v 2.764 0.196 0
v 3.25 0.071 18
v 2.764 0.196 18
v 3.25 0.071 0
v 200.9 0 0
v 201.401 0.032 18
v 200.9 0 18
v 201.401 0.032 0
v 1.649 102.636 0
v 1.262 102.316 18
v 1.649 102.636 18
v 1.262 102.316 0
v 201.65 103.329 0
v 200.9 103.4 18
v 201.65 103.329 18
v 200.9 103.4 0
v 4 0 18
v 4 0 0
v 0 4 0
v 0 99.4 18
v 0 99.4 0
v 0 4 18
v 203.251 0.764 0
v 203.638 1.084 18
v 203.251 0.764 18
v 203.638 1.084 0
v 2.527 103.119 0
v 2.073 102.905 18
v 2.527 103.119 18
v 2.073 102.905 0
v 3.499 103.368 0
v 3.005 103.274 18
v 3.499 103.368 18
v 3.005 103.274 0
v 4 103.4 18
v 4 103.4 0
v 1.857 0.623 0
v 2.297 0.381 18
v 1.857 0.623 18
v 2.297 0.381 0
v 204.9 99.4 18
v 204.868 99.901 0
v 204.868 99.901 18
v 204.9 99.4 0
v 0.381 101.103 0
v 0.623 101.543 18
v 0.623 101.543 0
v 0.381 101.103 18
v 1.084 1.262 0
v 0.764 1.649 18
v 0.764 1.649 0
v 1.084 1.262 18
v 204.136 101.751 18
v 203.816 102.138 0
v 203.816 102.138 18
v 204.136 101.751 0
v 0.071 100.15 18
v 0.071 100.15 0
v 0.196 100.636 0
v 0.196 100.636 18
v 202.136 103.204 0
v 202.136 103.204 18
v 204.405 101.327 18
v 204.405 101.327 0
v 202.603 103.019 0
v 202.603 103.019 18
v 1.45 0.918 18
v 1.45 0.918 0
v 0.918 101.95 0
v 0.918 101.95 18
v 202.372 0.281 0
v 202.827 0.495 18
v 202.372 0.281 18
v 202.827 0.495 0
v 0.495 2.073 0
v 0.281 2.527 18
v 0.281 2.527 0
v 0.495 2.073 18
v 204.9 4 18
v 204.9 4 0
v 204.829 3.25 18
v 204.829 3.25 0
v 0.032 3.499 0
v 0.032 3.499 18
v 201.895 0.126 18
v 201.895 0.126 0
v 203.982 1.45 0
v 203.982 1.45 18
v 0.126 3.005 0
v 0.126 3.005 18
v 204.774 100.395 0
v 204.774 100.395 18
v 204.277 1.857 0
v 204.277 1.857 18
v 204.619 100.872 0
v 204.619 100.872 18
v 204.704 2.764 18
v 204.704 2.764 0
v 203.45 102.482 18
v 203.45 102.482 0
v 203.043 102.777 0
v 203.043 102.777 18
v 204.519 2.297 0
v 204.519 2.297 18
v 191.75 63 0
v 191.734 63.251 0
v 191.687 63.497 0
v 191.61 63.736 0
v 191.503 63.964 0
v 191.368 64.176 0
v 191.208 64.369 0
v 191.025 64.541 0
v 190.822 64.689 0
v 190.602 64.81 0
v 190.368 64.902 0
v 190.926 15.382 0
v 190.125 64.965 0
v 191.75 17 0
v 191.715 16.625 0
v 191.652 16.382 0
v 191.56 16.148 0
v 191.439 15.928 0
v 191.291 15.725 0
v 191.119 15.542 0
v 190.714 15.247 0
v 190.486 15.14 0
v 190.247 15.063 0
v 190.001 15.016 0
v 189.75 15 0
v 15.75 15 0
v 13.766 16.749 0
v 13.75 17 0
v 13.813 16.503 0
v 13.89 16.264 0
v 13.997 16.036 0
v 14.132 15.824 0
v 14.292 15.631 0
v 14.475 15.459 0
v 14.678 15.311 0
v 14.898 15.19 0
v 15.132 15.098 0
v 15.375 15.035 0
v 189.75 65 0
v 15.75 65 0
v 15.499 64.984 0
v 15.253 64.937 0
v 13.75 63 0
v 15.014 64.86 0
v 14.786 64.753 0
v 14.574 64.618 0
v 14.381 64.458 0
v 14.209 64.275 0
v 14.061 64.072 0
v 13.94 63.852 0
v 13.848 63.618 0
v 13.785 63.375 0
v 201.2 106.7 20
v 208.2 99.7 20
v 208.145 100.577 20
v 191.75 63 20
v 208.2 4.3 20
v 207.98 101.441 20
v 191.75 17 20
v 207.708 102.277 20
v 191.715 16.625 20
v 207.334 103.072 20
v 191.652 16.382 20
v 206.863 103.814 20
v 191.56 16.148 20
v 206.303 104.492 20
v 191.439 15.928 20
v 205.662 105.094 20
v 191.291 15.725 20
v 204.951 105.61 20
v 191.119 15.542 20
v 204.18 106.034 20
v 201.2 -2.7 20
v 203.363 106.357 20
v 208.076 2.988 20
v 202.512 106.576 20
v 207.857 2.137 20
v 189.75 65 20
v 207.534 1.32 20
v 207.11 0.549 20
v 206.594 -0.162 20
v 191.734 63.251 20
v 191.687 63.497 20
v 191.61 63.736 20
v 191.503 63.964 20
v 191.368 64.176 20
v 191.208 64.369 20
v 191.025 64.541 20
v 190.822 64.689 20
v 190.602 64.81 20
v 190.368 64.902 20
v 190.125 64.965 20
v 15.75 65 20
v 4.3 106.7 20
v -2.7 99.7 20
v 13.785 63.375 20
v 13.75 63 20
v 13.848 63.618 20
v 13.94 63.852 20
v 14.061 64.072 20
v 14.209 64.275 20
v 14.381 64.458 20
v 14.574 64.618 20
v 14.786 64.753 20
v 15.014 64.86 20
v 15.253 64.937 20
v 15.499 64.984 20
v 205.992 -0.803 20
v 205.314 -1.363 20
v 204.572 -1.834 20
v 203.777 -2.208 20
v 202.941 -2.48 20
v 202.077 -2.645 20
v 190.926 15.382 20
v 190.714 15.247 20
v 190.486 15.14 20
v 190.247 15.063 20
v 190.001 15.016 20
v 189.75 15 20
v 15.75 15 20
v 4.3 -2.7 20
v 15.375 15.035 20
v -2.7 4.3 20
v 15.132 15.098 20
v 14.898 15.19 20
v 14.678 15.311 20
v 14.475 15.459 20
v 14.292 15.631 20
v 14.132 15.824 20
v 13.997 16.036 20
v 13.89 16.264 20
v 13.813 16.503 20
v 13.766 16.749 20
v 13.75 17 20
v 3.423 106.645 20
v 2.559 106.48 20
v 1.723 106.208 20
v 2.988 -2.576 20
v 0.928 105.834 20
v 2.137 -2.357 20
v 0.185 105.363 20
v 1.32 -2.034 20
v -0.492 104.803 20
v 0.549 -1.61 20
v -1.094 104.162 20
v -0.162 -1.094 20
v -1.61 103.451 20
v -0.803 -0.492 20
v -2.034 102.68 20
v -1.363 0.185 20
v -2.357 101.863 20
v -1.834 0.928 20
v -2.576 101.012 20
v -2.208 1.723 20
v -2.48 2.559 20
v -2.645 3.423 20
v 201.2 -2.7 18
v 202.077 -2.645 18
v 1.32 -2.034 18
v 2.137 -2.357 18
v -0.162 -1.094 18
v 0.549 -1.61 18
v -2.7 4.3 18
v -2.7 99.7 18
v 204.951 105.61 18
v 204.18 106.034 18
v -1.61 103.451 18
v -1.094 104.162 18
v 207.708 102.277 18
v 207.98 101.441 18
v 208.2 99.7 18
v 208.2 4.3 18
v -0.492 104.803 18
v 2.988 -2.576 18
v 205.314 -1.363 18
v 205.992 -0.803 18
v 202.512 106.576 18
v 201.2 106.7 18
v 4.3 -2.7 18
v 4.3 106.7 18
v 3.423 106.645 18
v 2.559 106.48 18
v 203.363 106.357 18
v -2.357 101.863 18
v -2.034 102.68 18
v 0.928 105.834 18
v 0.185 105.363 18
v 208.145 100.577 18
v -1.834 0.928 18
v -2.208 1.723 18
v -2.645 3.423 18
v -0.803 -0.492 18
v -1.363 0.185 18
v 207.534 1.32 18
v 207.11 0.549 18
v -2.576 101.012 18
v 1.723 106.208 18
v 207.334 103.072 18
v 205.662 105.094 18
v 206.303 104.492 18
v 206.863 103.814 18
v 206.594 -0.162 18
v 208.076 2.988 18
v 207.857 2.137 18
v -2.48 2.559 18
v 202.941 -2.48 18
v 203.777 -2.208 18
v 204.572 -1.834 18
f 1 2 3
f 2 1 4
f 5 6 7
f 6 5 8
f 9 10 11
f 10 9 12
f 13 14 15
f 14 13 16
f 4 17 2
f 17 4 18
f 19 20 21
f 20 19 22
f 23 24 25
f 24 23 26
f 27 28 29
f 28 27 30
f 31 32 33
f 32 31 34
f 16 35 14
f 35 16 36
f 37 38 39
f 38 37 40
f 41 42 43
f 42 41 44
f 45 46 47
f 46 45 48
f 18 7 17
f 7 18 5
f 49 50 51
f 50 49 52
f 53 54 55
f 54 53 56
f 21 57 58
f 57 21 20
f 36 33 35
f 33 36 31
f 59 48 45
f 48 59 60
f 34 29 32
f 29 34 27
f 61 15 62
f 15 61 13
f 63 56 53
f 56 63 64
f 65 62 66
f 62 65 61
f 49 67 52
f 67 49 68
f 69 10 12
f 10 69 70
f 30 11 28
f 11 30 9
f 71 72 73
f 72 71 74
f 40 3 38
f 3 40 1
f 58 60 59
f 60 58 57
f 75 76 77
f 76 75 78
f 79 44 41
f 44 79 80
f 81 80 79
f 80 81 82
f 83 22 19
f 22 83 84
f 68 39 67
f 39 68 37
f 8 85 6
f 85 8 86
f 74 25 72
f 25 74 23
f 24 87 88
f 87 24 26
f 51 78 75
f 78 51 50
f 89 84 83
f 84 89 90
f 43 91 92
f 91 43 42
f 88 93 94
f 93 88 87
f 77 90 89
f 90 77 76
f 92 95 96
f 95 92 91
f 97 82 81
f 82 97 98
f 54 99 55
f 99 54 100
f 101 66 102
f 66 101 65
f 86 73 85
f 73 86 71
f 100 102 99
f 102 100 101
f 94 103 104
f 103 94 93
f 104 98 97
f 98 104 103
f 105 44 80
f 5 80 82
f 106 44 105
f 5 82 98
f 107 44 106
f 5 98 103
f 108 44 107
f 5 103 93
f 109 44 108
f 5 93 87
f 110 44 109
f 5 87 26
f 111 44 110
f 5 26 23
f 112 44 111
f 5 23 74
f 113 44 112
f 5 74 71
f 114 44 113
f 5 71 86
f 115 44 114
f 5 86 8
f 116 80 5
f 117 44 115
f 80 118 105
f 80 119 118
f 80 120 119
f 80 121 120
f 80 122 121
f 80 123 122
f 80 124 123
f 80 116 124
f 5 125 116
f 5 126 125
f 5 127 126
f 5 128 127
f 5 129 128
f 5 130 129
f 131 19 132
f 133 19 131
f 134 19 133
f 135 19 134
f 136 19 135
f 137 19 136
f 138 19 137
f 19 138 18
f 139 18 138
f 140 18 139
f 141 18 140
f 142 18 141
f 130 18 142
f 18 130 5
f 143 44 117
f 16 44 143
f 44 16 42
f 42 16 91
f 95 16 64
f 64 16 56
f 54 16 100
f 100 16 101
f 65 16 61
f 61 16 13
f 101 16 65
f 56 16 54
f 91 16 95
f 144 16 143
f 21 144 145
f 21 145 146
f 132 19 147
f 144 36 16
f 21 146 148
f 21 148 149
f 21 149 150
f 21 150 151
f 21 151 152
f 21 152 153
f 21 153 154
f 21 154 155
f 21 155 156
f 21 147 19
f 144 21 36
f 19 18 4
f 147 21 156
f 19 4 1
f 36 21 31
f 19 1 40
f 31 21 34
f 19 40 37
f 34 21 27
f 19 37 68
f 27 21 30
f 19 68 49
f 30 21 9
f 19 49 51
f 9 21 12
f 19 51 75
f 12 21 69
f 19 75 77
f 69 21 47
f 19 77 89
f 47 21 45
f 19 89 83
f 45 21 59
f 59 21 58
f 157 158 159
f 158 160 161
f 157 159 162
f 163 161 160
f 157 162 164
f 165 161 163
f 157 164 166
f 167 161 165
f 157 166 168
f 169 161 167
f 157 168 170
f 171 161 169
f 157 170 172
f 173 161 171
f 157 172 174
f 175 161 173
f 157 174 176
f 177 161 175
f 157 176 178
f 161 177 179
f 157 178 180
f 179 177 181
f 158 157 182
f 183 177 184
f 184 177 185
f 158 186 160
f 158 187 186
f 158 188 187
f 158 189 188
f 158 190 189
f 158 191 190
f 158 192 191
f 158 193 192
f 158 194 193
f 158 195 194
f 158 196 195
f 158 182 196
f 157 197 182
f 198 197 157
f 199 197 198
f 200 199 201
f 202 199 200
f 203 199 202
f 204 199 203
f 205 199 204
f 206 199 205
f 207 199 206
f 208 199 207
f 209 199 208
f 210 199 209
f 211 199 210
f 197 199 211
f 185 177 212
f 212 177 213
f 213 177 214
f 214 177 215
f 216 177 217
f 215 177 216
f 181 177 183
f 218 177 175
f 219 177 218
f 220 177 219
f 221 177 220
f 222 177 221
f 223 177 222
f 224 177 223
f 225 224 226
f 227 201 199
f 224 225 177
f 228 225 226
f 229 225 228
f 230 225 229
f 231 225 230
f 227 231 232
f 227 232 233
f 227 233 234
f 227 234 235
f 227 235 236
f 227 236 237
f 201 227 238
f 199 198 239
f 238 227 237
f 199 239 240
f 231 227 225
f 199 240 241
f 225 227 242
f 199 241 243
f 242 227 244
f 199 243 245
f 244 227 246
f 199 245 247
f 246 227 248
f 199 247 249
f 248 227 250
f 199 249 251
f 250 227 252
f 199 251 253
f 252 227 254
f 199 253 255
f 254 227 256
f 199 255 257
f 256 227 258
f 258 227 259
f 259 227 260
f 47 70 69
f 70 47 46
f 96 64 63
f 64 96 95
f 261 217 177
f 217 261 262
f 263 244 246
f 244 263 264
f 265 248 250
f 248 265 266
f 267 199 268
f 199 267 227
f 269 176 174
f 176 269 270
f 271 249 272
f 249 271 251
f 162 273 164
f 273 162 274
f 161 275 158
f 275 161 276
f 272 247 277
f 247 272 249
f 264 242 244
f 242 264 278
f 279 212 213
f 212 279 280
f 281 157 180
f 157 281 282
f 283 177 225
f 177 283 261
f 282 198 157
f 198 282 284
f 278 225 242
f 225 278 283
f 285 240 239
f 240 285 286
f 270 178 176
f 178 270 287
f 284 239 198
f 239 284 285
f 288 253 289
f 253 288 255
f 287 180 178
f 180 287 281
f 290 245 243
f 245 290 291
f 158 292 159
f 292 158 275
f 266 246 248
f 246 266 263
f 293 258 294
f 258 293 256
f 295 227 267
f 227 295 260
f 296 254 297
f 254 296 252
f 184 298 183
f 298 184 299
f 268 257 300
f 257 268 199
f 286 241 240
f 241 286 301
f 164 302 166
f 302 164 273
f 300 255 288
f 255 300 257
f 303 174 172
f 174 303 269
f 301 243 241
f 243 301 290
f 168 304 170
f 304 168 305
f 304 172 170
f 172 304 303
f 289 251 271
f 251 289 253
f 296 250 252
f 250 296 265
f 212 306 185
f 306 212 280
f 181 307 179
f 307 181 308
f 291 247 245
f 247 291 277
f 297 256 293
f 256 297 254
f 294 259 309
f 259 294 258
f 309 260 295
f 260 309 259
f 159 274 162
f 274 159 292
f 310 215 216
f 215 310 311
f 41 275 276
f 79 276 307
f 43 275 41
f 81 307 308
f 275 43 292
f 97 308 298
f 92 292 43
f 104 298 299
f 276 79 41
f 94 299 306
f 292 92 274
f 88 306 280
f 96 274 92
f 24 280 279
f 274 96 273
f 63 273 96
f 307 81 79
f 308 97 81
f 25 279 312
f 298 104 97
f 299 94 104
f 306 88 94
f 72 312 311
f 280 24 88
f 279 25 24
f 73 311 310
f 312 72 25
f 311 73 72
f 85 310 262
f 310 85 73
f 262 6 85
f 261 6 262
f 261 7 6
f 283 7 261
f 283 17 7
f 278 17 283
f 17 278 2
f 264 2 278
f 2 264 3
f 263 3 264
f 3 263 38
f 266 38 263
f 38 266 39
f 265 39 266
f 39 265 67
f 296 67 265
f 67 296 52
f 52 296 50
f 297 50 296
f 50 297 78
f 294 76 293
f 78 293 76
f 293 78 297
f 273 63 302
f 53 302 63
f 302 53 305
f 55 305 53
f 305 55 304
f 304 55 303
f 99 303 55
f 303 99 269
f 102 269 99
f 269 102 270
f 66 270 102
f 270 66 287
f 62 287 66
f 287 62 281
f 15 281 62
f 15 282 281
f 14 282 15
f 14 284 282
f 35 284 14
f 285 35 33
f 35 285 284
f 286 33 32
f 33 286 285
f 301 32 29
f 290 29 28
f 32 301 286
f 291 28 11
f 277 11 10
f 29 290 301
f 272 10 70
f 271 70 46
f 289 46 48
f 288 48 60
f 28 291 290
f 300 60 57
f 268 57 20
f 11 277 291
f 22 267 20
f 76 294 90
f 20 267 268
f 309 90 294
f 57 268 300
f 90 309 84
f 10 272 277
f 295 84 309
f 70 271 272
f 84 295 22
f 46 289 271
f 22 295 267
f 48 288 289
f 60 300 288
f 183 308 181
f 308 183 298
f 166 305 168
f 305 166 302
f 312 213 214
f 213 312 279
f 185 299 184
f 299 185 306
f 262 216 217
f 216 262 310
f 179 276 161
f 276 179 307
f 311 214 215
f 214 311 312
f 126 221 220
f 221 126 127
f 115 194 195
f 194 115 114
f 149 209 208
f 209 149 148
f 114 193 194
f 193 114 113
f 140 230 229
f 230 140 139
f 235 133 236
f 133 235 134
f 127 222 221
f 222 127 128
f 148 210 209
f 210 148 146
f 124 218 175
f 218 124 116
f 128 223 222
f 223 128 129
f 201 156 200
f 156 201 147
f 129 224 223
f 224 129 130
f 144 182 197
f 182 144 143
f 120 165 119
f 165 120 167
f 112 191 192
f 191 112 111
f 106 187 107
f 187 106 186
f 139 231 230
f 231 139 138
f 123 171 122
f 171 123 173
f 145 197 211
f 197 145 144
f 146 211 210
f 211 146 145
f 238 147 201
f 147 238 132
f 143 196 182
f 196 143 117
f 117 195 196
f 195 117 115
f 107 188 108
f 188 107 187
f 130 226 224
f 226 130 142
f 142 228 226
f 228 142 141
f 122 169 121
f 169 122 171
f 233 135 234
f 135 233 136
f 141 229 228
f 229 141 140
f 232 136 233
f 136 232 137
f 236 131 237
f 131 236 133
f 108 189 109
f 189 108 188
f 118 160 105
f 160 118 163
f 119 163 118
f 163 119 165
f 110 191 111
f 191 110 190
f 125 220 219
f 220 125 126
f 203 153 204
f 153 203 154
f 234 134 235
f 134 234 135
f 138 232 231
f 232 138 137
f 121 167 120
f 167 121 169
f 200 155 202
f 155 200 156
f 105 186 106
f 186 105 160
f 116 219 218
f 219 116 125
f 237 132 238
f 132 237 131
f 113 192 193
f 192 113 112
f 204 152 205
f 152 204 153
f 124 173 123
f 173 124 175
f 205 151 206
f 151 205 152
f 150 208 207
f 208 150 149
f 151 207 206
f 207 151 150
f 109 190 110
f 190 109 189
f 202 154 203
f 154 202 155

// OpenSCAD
// Prado 2018 Radio Trim v2 — Based purely on radio dimensions
// OEM: Eclipse AVN-R8W  → 205.5 × 104mm face
// New: Sony XAV-AX8500  → 178 × 50mm DIN chassis
//
// The trim adapts the Eclipse-sized opening to the Sony DIN slot.
// Sony's floating screen (269×167mm) sits in front — not our concern.

// ── Dimensions (mm) ──────────────────────────────────────────

// Outer = OEM Eclipse face size (what the dash opening fits)
outer_w = 205.5;
outer_h = 104;

// Inner cutout = Sony DIN chassis
din_w = 178;
din_h = 50;

// Depth of the trim (how far it extends into the dash)
depth = 20;          // enough to grip, not too deep to interfere

// Front flange
flange = 3;          // lip that sits against dash face, prevents push-through
flange_t = 2;        // flange thickness

// Wall thickness
wall = 2.5;

// Corner radii
outer_r = 4;
din_r = 2;

// Tolerances
tol = 0.3;           // slight clearance on outer for snug fit

// DIN cutout position (NOT centered — Sony cage sits low in the opening)
// Measured: 15mm from bottom, ~39mm gap above
din_x = (outer_w - din_w) / 2;   // = 13.75mm (centered horizontally)
din_y = 15;                        // 15mm from bottom (matches client measurement)

// ── Build ────────────────────────────────────────────────────

$fn = 50;

module rounded_box(w, h, d, r) {
    linear_extrude(d)
        offset(r) offset(-r)
            square([w, h]);
}

difference() {
    union() {
        // Main body — fits into the dash opening
        rounded_box(outer_w - tol*2, outer_h - tol*2, depth, outer_r);

        // Front flange — overlaps the dash opening edge
        translate([-(flange - tol), -(flange - tol), depth - flange_t])
            rounded_box(outer_w + flange*2 - tol*2, outer_h + flange*2 - tol*2, flange_t, outer_r + flange);
    }

    // DIN cutout — goes all the way through
    translate([din_x, din_y, -1])
        rounded_box(din_w, din_h, depth + flange_t + 2, din_r);
}
